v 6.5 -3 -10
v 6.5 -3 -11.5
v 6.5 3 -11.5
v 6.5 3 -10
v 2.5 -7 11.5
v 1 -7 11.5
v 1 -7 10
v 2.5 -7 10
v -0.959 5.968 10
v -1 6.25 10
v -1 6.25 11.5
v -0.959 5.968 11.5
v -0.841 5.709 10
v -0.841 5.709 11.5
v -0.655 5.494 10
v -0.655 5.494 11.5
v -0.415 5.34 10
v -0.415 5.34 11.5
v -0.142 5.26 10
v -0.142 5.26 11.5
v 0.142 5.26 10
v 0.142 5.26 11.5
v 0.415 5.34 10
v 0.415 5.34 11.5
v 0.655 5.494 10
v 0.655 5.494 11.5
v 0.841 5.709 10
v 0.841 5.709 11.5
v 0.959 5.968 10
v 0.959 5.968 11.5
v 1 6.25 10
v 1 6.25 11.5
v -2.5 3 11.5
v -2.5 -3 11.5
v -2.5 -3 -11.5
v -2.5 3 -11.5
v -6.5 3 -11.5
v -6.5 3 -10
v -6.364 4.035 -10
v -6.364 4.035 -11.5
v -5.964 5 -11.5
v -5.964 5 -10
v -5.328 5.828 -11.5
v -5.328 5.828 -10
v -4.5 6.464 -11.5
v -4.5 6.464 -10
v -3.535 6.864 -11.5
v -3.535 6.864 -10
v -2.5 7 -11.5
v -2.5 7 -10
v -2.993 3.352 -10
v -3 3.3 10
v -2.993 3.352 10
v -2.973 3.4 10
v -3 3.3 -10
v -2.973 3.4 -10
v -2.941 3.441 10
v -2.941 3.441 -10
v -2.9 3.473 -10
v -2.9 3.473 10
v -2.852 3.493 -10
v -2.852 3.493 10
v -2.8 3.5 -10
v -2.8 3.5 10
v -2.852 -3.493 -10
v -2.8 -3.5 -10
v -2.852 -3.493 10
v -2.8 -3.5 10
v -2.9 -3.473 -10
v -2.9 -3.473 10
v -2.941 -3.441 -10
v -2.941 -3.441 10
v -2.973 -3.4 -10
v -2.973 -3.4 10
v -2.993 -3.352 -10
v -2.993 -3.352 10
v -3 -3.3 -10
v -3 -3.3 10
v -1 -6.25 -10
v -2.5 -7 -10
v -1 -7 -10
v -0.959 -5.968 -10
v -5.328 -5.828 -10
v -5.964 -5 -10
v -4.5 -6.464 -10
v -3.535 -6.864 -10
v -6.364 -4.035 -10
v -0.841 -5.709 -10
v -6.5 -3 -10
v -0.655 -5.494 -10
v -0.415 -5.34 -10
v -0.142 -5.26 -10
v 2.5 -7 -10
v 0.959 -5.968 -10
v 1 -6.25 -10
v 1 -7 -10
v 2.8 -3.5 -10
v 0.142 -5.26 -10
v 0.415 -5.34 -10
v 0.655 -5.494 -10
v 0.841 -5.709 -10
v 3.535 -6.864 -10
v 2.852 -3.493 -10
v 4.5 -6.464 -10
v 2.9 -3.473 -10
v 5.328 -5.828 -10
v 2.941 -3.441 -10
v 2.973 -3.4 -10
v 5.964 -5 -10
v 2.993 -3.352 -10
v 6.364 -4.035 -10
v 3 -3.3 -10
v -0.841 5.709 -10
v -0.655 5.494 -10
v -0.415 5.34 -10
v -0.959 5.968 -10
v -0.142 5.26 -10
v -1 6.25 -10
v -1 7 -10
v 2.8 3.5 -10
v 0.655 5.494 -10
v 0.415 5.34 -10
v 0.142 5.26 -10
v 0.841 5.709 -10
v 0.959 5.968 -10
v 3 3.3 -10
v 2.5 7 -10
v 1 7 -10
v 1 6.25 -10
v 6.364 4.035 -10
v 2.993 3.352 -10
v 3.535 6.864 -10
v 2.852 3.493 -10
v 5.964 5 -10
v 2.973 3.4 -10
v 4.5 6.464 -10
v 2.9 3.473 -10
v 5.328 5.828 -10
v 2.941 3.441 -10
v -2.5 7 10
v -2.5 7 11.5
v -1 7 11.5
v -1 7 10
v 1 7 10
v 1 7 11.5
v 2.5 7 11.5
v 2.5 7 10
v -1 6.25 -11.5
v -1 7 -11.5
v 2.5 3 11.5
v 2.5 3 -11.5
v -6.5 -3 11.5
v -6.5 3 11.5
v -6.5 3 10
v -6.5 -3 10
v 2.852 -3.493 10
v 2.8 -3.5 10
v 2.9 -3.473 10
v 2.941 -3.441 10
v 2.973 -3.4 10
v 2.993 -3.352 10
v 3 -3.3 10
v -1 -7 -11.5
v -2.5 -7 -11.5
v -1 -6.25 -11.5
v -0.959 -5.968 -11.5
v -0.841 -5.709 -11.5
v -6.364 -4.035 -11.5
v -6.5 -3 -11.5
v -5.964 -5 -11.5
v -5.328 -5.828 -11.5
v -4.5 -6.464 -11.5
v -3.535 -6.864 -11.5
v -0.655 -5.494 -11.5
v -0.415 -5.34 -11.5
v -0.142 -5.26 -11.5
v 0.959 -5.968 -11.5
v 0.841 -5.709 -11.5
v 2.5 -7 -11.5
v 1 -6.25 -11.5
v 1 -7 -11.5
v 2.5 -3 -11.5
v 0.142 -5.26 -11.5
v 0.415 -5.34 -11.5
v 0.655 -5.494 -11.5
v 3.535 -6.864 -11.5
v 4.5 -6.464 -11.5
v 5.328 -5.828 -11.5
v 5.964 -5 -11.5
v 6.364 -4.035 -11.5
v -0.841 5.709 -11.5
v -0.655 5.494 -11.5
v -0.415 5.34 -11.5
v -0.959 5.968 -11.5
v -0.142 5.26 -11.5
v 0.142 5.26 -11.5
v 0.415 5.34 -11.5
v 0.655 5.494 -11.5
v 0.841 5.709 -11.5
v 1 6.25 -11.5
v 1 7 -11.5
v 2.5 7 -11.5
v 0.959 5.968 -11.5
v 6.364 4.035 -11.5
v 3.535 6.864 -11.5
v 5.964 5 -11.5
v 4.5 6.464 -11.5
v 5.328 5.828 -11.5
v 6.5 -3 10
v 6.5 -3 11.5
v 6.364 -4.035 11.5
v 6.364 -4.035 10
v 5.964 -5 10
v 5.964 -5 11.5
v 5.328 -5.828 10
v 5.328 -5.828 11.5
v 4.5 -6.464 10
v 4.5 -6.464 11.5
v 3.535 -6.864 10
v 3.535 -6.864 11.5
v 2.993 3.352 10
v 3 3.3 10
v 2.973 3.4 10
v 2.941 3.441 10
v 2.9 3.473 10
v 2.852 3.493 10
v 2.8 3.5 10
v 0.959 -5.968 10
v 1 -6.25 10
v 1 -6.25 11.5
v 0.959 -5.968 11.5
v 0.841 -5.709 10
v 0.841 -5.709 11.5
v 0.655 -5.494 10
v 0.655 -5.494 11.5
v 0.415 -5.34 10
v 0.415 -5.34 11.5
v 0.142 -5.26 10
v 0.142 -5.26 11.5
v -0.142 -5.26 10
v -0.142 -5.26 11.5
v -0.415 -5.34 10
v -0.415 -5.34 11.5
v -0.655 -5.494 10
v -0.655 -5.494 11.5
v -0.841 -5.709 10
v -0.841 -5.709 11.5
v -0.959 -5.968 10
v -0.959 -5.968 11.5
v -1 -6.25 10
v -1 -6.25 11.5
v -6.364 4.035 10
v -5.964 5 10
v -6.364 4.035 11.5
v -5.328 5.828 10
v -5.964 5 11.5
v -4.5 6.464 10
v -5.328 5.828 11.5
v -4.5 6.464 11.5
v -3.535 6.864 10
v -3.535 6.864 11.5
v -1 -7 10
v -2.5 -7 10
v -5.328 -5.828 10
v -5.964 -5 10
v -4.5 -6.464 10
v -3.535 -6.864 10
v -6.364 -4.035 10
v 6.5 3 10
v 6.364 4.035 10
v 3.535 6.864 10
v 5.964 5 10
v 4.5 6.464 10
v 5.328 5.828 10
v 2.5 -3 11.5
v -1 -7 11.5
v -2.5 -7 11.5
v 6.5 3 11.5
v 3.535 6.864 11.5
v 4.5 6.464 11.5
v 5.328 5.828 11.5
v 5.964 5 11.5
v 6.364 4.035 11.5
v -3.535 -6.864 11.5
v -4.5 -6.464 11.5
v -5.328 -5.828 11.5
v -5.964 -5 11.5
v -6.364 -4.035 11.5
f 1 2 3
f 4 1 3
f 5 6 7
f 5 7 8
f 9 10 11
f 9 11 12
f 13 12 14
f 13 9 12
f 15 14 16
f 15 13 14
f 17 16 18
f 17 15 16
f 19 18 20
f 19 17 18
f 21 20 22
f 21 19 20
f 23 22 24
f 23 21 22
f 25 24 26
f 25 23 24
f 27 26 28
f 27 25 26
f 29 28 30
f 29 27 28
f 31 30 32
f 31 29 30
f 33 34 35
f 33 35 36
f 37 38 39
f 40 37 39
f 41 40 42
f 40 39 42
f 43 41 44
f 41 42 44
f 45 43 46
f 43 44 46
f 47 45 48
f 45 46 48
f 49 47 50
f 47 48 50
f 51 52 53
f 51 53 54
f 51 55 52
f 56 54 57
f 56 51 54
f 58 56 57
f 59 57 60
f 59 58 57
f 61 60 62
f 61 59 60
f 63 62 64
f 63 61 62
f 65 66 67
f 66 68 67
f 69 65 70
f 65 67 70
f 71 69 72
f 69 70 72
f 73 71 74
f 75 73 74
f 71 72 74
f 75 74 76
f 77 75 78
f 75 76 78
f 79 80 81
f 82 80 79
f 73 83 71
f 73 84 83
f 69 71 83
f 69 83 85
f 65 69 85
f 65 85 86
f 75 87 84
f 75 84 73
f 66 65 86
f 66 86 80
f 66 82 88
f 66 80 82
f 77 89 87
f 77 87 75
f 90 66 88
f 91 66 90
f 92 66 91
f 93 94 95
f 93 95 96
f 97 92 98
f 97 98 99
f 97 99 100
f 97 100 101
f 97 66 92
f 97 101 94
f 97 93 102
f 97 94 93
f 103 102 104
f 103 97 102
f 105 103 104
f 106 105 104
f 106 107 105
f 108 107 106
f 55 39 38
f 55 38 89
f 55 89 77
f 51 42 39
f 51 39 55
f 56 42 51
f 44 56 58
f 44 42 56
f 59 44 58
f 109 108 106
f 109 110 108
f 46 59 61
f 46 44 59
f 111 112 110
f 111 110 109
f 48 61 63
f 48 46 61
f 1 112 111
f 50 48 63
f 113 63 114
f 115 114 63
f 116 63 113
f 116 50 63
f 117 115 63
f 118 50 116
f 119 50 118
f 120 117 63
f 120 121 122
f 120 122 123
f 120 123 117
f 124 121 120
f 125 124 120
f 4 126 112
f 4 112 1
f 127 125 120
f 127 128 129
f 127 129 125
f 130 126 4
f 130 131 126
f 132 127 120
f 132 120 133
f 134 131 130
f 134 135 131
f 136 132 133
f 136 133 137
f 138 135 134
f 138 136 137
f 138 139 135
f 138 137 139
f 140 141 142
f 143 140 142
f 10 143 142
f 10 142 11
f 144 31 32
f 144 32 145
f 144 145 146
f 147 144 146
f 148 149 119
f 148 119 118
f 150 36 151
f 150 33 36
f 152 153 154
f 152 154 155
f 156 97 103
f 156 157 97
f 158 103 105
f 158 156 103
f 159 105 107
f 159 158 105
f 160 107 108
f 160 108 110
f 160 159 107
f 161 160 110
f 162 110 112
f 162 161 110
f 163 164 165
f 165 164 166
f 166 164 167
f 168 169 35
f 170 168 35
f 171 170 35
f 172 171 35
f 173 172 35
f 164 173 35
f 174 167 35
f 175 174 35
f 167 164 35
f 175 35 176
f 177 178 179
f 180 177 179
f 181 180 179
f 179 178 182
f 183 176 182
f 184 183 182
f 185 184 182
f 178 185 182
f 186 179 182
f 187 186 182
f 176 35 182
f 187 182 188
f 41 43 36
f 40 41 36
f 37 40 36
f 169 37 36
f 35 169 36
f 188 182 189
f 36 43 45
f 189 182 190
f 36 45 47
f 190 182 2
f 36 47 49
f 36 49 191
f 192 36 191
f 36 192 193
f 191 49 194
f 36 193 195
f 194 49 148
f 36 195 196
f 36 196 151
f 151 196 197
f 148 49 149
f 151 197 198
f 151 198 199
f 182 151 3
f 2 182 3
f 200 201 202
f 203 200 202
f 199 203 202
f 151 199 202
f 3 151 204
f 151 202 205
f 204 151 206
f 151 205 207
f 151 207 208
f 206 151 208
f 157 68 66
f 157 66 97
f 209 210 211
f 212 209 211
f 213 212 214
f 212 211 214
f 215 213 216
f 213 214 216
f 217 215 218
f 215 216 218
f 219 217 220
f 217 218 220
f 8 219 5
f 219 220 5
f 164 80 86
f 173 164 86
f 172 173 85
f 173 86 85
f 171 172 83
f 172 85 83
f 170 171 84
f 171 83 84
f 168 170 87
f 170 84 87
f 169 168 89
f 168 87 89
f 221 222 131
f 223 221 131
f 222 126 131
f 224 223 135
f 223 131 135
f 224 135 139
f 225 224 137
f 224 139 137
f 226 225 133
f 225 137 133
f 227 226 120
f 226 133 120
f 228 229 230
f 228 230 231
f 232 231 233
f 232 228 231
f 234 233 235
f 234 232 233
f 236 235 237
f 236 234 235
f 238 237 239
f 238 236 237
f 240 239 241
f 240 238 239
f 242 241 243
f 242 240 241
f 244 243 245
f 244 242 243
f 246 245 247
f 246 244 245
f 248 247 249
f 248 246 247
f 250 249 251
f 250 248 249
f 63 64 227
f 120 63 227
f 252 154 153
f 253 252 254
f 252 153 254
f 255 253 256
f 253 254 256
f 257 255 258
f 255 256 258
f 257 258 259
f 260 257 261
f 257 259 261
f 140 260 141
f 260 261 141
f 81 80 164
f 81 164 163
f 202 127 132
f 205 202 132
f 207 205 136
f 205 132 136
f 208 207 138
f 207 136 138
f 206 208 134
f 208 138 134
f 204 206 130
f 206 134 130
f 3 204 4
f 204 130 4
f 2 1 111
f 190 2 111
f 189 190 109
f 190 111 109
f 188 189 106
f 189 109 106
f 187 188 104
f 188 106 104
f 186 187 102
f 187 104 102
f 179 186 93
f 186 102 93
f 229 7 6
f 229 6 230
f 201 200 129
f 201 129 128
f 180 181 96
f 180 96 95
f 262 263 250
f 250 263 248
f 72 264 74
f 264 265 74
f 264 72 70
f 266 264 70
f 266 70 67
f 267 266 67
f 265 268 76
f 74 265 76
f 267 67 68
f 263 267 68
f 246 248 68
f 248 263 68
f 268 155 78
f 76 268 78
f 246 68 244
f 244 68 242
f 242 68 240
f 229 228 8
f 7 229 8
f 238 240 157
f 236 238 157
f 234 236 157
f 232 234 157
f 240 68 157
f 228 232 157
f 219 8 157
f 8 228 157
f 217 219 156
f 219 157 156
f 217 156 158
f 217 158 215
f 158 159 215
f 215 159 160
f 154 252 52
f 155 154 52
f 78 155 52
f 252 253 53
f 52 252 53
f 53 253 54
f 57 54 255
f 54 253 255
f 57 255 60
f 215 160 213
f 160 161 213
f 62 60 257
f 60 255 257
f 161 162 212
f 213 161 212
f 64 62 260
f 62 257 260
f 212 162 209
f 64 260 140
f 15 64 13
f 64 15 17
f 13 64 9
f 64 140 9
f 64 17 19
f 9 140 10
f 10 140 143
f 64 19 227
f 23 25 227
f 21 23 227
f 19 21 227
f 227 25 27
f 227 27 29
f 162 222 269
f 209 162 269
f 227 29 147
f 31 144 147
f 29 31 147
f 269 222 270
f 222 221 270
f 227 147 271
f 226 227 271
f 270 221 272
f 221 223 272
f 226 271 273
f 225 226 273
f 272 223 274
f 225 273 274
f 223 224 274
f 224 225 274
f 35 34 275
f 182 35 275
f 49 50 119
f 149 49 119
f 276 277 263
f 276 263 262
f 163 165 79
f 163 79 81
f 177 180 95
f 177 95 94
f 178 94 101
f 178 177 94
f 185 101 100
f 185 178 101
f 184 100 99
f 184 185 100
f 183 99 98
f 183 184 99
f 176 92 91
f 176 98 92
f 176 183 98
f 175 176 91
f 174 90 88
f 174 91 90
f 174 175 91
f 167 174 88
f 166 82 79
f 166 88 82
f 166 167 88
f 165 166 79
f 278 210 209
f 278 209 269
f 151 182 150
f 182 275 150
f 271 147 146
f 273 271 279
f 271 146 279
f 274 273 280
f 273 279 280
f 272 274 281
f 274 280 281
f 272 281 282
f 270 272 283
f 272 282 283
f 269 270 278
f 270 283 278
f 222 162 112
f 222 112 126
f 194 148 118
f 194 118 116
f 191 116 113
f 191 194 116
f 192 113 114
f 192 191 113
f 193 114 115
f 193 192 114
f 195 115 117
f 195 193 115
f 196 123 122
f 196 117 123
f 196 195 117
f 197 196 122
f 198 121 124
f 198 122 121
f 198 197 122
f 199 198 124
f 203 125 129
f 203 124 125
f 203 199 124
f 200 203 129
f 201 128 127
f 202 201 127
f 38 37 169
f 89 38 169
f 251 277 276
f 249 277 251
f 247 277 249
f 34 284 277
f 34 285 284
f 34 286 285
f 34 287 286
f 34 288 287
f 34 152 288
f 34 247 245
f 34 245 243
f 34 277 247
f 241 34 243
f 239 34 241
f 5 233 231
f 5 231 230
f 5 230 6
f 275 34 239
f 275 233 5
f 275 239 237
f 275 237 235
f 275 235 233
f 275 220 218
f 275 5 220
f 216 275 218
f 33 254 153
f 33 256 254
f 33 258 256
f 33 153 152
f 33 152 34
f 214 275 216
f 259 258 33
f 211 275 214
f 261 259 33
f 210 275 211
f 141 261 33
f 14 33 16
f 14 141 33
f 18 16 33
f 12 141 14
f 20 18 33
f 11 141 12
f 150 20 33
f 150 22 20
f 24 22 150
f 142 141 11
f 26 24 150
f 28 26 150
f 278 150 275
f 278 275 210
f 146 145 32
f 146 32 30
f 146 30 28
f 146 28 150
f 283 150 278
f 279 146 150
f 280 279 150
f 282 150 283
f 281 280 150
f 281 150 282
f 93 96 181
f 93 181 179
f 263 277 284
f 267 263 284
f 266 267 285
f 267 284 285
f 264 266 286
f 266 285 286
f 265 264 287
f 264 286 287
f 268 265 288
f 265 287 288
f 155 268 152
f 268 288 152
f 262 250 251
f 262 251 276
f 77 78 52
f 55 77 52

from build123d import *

# Parameters (mm, degrees)
SKETCH_1_W               = 6
SKETCH_1_H               = 7
SKETCH_1_W_2             = 5
SKETCH_1_H_2             = 6
EXTRUDE_1_DEPTH          = 11.5
SKETCH_2_W               = 6
SKETCH_2_H               = 7
EXTRUDE_2_DEPTH          = 1.5
SKETCH_3_R               = 19.100398606
SKETCH_3_W               = 18.715870292
SKETCH_3_H               = 14
CUT_EXTRUDE_1_DEPTH      = 26.719642299
CUT_EXTRUDE_2_DEPTH      = 25.904818811
CUT_EXTRUDE_3_DEPTH      = 25.904818811
CUT_EXTRUDE_3_DEPTH_BACK = 25.904818811
FILLET_1_R               = 0.2


with BuildPart() as part:
    # 草图1 → 凸台-拉伸1 (new, symmetric)
    with BuildSketch(Plane.XY):
        Rectangle(SKETCH_1_W, SKETCH_1_H)
        Rectangle(SKETCH_1_W_2, SKETCH_1_H_2, mode=Mode.SUBTRACT)
    extrude(amount=EXTRUDE_1_DEPTH, both=True)

    # 草图2 → 凸台-拉伸2 (add)
    with BuildSketch(Plane.XY.offset(11.5)):
        with BuildLine():
            Line((-6.5, 6.92820323), (-6.5, -6.92820323))
            ThreePointArc((-6.5, -6.92820323), (0, -9.5), (6.5, -6.92820323))
            Line((6.5, -6.92820323), (6.5, 6.92820323))
            ThreePointArc((6.5, 6.92820323), (0, 9.5), (-6.5, 6.92820323))
        make_face()
        Rectangle(SKETCH_2_W, SKETCH_2_H, mode=Mode.SUBTRACT)
    extrude_2 = extrude(amount=-EXTRUDE_2_DEPTH)

    # 镜向1: 凸台-拉伸2 across plane
    add(extrude_2.mirror(Plane.XY))

    # 草图3 → 切除-拉伸1 (cut, through all)
    with BuildSketch(Plane.XY.offset(11.5)):
        Circle(SKETCH_3_R)
        Rectangle(SKETCH_3_W, SKETCH_3_H, mode=Mode.SUBTRACT)
    extrude(amount=-CUT_EXTRUDE_1_DEPTH, mode=Mode.SUBTRACT)

    # 草图4 → 切除-拉伸2 (cut, through all)
    with BuildSketch(Plane.XY.offset(11.5)):
        with BuildLine():
            Line((-6.5, 6.92820323), (-6.5, 3))
            ThreePointArc((-6.5, 3), (-5.328427125, 5.828427125), (-2.5, 7))
            Line((-2.5, 7), (-6.422616289, 7))
            ThreePointArc((-6.422616289, 7), (-6.461407868, 6.964209098), (-6.5, 6.92820323))
        make_face()
        with BuildLine():
            ThreePointArc((2.5, 7), (5.328427125, 5.828427125), (6.5, 3))
            Line((6.5, 3), (6.5, 6.92820323))
            ThreePointArc((6.5, 6.92820323), (6.461407868, 6.964209098), (6.422616289, 7))
            Line((6.422616289, 7), (2.5, 7))
        make_face()
        with BuildLine():
            ThreePointArc((6.5, -3), (5.328427127, -5.828427123), (2.500000005, -7))
            Line((2.500000005, -7), (6.422616289, -7))
            ThreePointArc((6.422616289, -7), (6.461407868, -6.964209098), (6.5, -6.92820323))
            Line((6.5, -6.92820323), (6.5, -3))
        make_face()
        with BuildLine():
            ThreePointArc((-6.5, -6.92820323), (-6.461407868, -6.964209098), (-6.422616289, -7))
            Line((-6.422616289, -7), (-2.499999995, -7))
            ThreePointArc((-2.499999995, -7), (-5.328427123, -5.828427127), (-6.5, -3))
            Line((-6.5, -3), (-6.5, -6.92820323))
        make_face()
    extrude(amount=-CUT_EXTRUDE_2_DEPTH, mode=Mode.SUBTRACT)

    # 草图5 → 切除-拉伸3 (cut, two sides: drawn at the far end of the back side and taken through both)
    with BuildSketch(Plane.XY.offset(11.5).offset(-CUT_EXTRUDE_3_DEPTH_BACK)):
        with BuildLine():
            Line((1, 6.25), (1, 7))
            Line((1, 7), (-1, 7))
            Line((-1, 7), (-1, 6.25))
            ThreePointArc((-1, 6.25), (0, 5.25), (1, 6.25))
        make_face()
        with BuildLine():
            Line((1, -7), (1, -6.25))
            ThreePointArc((1, -6.25), (0, -5.25), (-1, -6.25))
            Line((-1, -6.25), (-1, -7))
            Line((-1, -7), (1, -7))
        make_face()
    extrude(amount=CUT_EXTRUDE_3_DEPTH + CUT_EXTRUDE_3_DEPTH_BACK, mode=Mode.SUBTRACT)

    # 圆角1
    fillet_1_edges = [part.edges().sort_by_distance(p)[0] for p in [
        (-3, 3.5, 0),
        (3, 3.5, 0),
        (3, -3.5, 0),
        (-3, -3.5, 0),
    ]]
    fillet(fillet_1_edges, radius=FILLET_1_R)


solid = part.part
